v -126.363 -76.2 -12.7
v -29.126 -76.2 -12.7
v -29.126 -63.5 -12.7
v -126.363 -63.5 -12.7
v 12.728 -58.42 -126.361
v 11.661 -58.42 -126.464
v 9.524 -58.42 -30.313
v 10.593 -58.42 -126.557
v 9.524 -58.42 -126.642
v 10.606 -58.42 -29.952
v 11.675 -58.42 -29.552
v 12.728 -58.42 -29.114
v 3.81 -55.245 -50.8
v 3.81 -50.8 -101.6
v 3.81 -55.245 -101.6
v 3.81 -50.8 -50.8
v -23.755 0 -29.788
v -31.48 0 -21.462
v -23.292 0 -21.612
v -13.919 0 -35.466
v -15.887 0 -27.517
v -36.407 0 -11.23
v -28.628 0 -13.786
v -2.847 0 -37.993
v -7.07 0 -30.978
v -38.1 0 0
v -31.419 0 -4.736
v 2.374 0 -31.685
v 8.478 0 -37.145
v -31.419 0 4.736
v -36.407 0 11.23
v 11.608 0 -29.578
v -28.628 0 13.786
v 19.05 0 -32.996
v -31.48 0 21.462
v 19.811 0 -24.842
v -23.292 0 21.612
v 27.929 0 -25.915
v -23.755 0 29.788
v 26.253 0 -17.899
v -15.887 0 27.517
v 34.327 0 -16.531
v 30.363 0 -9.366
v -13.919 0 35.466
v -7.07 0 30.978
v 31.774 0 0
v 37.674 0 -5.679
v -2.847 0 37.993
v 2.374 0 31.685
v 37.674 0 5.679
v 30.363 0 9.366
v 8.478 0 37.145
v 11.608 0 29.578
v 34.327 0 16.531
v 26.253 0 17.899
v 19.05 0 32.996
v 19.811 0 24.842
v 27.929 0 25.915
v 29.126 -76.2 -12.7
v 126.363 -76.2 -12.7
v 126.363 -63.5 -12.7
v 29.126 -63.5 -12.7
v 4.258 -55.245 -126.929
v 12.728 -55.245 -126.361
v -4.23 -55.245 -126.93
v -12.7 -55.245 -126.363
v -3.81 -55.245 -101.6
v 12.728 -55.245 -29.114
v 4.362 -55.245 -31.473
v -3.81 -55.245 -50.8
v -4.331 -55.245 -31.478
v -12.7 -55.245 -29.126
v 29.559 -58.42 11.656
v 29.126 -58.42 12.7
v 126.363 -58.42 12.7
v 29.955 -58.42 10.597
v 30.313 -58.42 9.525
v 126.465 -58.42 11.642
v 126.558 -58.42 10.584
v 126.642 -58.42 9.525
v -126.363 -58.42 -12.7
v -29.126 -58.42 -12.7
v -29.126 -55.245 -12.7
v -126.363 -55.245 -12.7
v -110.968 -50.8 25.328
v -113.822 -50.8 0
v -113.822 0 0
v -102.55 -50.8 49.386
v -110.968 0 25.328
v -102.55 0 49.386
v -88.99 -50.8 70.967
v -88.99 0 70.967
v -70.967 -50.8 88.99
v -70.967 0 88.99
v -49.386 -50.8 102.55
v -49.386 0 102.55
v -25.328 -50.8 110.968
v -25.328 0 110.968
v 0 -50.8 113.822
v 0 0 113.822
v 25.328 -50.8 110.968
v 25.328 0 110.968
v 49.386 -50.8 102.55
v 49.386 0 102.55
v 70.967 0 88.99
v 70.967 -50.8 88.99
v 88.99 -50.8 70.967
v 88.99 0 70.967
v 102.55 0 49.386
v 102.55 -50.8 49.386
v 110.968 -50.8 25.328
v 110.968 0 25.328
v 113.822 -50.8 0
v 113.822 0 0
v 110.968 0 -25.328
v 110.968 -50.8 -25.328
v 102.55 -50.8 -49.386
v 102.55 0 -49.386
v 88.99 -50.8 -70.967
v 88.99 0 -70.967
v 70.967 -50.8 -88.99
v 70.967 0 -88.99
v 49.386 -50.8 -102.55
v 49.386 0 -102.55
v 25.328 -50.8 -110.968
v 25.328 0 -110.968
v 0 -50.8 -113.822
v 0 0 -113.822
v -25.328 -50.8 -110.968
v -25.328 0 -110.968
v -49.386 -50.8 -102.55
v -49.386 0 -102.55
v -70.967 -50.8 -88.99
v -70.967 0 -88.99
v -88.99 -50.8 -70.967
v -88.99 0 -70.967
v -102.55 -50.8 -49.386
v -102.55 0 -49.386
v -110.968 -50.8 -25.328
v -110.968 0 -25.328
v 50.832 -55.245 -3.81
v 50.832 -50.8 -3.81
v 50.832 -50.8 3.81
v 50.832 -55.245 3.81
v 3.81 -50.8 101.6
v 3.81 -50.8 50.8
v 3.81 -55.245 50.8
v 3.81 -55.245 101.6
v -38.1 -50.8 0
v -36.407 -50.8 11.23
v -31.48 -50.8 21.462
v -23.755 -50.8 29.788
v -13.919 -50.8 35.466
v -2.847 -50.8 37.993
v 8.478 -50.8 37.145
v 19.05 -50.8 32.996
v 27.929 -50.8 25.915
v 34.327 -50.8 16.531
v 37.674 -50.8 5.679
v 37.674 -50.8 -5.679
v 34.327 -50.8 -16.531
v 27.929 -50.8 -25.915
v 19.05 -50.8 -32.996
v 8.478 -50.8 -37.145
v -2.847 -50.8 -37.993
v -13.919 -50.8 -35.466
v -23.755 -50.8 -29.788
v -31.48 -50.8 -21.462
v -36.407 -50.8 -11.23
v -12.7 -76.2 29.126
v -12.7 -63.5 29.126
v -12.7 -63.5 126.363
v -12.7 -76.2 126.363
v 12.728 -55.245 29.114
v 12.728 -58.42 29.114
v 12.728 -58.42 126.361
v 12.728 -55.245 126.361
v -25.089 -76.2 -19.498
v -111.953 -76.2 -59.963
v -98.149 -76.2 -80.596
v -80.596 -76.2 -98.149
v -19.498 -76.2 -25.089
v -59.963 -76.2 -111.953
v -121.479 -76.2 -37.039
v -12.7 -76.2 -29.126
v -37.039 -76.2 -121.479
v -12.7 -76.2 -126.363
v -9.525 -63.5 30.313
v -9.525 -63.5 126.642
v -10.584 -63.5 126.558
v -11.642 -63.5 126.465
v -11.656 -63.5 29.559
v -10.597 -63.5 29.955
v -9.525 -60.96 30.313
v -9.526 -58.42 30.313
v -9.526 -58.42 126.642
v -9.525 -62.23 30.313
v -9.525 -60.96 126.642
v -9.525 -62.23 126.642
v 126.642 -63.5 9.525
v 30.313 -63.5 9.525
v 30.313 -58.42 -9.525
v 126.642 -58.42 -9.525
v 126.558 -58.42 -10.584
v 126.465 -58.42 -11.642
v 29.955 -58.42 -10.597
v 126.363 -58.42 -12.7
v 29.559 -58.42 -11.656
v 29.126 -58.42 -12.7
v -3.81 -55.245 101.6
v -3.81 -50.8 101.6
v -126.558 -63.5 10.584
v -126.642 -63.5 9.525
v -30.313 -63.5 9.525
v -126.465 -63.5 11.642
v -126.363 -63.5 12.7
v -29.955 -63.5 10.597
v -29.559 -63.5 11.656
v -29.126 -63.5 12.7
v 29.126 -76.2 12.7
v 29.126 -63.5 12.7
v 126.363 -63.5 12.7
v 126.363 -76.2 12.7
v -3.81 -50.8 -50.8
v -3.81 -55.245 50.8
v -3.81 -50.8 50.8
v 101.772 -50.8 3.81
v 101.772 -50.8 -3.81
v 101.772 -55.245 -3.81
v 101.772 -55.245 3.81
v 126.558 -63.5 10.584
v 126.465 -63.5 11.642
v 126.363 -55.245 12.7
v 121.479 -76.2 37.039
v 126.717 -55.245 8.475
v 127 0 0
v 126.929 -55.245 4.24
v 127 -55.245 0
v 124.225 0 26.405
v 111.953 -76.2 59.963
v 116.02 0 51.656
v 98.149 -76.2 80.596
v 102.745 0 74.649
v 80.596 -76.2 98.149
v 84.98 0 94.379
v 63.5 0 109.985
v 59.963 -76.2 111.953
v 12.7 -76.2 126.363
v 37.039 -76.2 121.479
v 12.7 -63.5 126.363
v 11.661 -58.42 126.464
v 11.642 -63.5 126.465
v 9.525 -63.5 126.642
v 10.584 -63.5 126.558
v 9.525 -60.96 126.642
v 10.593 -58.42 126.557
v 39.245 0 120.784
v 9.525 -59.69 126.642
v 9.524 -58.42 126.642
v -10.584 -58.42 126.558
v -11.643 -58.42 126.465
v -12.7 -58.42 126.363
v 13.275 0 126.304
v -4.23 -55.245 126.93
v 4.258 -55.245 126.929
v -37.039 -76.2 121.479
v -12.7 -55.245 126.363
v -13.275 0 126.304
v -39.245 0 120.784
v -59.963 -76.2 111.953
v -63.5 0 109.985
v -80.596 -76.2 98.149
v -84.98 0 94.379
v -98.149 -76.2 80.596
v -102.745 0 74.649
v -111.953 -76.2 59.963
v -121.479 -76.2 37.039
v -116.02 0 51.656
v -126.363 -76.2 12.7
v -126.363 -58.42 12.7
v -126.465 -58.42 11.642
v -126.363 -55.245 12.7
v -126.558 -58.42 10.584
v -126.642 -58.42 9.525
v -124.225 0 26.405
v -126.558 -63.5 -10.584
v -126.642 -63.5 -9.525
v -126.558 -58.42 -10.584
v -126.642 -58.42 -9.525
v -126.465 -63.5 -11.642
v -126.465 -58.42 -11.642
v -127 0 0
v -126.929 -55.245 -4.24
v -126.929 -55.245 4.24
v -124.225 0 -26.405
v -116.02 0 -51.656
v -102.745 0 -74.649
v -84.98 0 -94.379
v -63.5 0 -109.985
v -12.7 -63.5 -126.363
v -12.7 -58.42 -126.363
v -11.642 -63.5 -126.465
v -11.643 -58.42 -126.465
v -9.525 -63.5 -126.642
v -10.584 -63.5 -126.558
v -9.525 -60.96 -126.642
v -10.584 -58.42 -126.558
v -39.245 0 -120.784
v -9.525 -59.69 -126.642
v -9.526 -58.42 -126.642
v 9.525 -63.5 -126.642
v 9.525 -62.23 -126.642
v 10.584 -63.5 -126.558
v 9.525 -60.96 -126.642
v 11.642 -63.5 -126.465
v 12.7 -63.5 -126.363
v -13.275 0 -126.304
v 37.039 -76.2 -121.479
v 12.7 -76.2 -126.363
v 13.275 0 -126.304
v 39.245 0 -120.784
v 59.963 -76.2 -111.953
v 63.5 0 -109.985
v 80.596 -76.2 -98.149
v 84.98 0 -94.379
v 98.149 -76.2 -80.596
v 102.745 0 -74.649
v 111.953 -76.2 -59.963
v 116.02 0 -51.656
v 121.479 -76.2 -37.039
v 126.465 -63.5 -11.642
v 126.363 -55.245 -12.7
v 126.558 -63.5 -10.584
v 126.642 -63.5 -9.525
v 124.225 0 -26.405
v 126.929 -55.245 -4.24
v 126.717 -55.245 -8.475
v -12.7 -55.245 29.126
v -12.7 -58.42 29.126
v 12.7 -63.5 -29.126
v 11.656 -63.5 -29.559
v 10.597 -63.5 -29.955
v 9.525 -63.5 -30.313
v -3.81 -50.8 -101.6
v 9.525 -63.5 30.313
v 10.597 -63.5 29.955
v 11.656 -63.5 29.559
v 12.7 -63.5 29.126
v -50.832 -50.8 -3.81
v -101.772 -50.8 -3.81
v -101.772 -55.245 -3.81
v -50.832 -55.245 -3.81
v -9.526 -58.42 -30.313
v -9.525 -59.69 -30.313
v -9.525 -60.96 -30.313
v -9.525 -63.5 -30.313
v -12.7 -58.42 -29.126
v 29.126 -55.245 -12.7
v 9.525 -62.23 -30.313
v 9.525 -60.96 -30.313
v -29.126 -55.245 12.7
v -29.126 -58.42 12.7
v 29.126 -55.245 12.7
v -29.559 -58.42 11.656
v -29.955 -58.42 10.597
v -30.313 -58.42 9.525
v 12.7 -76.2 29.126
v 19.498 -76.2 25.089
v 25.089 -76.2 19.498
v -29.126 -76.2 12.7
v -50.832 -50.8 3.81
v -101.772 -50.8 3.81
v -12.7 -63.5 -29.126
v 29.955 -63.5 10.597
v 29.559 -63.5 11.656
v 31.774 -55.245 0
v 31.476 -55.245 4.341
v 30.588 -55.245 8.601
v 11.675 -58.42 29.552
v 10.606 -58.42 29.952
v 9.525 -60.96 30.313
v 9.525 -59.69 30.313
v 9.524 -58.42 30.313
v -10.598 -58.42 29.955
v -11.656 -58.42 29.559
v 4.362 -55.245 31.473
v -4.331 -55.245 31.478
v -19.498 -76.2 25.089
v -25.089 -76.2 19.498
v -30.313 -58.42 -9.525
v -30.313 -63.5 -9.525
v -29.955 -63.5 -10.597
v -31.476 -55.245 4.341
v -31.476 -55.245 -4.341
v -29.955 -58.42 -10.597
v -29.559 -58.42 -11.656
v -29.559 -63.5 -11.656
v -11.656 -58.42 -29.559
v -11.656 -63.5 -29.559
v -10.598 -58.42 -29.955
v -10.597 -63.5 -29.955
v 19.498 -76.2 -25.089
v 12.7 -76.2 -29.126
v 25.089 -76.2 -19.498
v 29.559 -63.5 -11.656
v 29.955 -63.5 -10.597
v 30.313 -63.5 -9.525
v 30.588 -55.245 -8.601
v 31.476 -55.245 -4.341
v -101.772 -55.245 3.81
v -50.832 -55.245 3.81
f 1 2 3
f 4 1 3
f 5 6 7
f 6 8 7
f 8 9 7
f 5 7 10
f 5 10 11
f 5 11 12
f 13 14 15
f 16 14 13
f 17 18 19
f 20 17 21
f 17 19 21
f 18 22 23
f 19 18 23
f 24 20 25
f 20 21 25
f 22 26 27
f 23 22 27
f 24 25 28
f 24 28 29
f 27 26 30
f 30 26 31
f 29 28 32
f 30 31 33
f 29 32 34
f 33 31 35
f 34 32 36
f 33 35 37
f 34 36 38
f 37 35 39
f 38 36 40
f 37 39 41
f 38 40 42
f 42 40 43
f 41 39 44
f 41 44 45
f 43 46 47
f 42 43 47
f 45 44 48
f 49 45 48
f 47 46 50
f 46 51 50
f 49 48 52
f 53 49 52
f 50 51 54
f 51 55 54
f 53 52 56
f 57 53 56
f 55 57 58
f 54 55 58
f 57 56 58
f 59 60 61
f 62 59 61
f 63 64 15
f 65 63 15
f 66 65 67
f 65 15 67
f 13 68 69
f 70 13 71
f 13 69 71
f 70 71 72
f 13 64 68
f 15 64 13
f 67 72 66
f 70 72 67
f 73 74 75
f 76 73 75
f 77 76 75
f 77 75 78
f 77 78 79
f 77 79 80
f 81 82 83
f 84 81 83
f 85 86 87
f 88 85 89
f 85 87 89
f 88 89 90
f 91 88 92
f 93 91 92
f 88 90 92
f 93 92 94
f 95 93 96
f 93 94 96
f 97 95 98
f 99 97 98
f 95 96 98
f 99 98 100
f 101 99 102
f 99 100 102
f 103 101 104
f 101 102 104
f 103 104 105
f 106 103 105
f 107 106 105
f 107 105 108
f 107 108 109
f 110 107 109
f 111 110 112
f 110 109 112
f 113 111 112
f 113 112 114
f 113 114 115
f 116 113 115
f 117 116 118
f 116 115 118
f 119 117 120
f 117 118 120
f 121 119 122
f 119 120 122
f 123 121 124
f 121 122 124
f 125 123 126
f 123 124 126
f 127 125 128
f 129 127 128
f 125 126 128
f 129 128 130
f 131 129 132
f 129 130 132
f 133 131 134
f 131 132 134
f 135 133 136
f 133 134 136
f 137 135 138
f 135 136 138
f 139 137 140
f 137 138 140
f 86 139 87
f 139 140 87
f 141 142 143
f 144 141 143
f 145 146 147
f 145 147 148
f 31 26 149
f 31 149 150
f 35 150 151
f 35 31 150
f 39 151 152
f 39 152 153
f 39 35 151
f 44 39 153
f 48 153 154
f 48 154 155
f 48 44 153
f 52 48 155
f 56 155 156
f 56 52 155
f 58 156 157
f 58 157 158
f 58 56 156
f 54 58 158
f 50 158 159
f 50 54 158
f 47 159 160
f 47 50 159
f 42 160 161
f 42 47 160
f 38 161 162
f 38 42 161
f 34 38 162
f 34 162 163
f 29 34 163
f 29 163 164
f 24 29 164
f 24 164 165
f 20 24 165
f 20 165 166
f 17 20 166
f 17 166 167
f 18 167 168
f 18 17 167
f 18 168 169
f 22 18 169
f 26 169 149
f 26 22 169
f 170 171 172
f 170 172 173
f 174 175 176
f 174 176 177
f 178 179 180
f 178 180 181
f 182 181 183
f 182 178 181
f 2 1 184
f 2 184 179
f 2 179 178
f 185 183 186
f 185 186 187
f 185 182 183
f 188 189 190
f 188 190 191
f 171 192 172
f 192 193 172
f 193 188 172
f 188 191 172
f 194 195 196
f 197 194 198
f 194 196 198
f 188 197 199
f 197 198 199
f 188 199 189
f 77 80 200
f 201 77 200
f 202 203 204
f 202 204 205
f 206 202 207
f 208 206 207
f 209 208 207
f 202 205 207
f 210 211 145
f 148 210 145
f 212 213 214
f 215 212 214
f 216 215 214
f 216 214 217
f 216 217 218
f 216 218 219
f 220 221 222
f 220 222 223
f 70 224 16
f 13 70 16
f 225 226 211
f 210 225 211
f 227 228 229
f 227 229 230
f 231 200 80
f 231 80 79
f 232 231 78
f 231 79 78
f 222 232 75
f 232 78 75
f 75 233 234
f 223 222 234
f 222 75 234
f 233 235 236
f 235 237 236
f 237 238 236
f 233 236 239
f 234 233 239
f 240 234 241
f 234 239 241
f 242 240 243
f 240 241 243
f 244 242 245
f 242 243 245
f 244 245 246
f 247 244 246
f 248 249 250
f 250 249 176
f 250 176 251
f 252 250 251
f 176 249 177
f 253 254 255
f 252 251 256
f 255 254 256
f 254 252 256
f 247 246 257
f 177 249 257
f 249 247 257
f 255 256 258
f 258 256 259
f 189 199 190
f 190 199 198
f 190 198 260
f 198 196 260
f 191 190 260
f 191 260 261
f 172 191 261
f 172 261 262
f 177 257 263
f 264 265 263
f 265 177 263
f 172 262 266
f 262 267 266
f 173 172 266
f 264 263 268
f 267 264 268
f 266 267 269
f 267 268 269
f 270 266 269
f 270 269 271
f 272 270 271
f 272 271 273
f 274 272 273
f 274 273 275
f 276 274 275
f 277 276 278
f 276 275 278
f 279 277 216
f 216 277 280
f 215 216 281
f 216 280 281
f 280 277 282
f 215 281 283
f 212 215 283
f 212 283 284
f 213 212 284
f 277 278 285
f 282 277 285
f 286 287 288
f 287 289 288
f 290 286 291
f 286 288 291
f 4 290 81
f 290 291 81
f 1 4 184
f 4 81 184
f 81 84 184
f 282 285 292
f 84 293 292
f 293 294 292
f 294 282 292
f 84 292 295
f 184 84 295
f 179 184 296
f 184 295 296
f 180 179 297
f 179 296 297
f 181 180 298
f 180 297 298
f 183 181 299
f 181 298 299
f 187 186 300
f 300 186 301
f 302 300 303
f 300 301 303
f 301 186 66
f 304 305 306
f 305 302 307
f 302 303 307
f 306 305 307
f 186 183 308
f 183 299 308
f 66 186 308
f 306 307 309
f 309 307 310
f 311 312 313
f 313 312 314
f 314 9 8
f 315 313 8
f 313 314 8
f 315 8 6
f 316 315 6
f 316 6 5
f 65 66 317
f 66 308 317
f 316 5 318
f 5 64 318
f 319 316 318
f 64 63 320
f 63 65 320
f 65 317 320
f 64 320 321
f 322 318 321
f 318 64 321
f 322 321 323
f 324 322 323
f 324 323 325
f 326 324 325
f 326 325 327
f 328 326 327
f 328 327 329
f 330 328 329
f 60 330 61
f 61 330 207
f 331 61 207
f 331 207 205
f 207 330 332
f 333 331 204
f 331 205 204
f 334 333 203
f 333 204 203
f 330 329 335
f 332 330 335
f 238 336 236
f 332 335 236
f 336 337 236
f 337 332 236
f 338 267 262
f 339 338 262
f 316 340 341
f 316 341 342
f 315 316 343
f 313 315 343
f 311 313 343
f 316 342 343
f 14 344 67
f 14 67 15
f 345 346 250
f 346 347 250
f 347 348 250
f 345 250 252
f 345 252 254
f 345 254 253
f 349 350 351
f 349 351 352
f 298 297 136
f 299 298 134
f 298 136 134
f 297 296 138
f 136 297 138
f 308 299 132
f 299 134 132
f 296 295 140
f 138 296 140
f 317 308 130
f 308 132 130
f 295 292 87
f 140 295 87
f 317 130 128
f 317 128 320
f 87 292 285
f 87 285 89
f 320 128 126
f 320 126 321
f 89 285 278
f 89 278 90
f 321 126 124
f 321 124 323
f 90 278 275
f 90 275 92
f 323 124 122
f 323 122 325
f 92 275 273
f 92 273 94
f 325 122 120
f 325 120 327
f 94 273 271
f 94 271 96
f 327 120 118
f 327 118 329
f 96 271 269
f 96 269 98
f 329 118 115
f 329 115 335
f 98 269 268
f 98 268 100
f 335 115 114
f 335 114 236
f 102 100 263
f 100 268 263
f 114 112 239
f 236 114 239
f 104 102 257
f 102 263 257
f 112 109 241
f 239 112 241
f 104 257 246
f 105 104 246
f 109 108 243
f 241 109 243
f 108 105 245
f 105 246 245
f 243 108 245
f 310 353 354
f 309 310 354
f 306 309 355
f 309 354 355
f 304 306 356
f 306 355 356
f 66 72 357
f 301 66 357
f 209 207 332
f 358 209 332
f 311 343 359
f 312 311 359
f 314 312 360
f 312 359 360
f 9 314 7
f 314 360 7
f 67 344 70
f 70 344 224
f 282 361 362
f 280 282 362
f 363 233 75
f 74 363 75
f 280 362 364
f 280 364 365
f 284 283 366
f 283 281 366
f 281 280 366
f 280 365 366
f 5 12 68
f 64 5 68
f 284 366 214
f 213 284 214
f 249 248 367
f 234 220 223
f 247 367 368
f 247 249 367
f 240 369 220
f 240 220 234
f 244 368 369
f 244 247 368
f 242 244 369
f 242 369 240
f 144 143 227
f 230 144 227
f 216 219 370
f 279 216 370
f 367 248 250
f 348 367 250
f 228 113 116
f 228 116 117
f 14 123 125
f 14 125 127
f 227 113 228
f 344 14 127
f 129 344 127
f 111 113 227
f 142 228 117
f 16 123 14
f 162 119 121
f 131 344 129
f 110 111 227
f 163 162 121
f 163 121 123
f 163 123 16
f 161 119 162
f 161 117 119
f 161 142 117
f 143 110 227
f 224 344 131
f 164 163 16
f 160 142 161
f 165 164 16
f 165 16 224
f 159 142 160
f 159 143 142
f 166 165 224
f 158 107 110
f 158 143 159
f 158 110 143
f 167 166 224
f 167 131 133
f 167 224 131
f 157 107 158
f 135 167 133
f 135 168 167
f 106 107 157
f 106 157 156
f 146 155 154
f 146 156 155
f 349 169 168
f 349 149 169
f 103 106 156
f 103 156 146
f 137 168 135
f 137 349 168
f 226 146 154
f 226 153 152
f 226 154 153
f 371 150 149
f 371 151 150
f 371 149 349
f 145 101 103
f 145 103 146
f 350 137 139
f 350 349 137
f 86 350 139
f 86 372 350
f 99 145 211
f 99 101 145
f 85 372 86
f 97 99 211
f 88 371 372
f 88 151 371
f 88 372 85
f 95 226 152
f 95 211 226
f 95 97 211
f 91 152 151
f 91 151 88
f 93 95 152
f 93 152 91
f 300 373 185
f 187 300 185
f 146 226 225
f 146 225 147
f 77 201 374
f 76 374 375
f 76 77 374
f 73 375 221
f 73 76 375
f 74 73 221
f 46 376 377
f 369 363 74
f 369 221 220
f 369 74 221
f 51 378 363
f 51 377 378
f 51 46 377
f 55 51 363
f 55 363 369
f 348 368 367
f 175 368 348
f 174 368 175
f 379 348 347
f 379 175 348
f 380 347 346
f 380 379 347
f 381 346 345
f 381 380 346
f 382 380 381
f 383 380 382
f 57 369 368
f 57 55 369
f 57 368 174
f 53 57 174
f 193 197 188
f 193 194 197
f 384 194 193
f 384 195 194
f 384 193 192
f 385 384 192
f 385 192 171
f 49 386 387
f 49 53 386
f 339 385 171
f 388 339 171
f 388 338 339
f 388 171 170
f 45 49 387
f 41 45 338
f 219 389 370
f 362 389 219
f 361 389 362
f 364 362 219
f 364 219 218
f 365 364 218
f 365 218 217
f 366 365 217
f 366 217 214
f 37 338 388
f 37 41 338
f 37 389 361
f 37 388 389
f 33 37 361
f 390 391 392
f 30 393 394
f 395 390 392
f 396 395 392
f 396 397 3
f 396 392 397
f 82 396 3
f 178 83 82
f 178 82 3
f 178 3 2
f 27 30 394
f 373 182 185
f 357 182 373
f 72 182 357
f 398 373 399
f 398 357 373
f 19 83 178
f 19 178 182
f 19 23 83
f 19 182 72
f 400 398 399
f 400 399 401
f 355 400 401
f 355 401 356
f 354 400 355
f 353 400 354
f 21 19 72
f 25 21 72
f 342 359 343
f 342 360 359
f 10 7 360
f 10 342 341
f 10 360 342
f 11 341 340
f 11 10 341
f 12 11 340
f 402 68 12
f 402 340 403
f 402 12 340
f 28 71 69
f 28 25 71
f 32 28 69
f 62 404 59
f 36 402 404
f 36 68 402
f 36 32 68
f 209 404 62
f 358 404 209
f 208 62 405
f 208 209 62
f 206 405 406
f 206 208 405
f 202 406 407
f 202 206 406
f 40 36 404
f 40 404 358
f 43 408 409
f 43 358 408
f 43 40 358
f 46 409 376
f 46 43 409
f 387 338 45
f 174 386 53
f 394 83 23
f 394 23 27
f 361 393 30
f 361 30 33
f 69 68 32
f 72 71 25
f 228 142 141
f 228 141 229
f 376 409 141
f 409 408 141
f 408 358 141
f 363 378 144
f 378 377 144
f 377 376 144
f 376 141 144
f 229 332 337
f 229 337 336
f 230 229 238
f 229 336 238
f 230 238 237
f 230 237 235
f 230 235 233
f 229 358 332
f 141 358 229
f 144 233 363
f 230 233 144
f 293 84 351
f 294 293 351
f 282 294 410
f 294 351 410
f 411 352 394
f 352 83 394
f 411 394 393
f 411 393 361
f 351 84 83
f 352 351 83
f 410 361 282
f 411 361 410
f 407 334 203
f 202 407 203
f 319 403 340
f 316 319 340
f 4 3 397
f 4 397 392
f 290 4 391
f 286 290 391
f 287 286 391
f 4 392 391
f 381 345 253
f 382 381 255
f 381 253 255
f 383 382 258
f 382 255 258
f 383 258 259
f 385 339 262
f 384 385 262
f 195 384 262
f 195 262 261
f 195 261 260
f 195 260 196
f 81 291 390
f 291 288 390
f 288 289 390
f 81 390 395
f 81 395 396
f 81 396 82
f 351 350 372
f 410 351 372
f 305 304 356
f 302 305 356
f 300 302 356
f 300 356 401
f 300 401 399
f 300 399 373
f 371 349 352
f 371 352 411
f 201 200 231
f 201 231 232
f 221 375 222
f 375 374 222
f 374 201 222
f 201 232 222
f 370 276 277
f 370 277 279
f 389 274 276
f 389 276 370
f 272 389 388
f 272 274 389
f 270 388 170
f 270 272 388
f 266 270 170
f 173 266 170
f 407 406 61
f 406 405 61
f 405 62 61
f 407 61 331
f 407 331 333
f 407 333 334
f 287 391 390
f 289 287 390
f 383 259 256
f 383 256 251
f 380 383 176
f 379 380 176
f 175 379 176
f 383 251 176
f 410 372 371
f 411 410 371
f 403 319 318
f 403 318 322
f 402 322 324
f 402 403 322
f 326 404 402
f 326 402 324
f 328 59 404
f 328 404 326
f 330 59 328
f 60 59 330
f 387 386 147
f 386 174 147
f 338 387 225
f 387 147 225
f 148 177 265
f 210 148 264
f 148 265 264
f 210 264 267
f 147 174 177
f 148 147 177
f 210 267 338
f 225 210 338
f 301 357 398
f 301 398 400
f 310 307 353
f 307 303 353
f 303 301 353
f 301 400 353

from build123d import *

# Parameters (mm, degrees)
F0_R     = 127
F0_R_2   = 31.774252
F1_DEPTH = 76.2
F3_DEPTH = 127
F5_DEPTH = 127
F6_R     = 113.822054
F6_R_2   = 38.1
F7_DEPTH = 50.8
F8_W     = 50.940839
F8_H     = 7.62
F8_W_2   = 7.62
F8_H_2   = 50.8
F9_DEPTH = 76.2


with BuildPart() as f1:
    # F0 (on Front) → F1 (new body)
    with BuildSketch(Plane.XZ):
        Circle(F0_R)
        Circle(F0_R_2, mode=Mode.SUBTRACT)
    extrude(amount=F1_DEPTH)

    # F2 (on Right) → F3 (cut, symmetric)
    with BuildSketch(Plane.YZ):
        Polygon((-63.5, 12.7), (-76.2, 12.7), (-76.2, -12.7), (-63.5, -12.7), (-63.5, -9.525), (-58.42, -9.525), (-58.42, -12.7), (-55.245, -12.7), (-55.245, 12.7), (-58.42, 12.7), (-58.42, 9.525), (-63.5, 9.525), align=None)
    extrude(amount=F3_DEPTH, both=True, mode=Mode.SUBTRACT)

    # F4 (on Top) → F5 (cut, symmetric)
    with BuildSketch(Plane.XY):
        Polygon((12.7, -76.2), (12.7, -63.5), (9.525, -63.5), (9.524411, -58.42), (12.728042, -58.42), (12.728042, -55.245), (-12.7, -55.245), (-12.7, -58.42), (-9.52559, -58.42), (-9.525, -63.5), (-12.7, -63.5), (-12.7, -76.2), align=None)
    extrude(amount=F5_DEPTH, both=True, mode=Mode.SUBTRACT)

    # F6 (on face) → F7 (cut)
    with BuildSketch(Plane(origin=(0, 0, 0), x_dir=(-1, 0, 0), z_dir=(0, 1, 0))):
        Circle(F6_R)
        Circle(F6_R_2, mode=Mode.SUBTRACT)
    extrude(amount=-F7_DEPTH, mode=Mode.SUBTRACT)

    # F8 (on Front) → F9 (cut)
    with BuildSketch(Plane.XZ):
        with Locations((76.30205, 0)):
            Rectangle(F8_W, F8_H)
        with Locations((-76.30205, 0)):
            Rectangle(F8_W, F8_H)
        with Locations((0, -76.2)):
            Rectangle(F8_W_2, F8_H_2)
        with Locations((0, 76.2)):
            Rectangle(F8_W_2, F8_H_2)
    extrude(amount=F9_DEPTH, mode=Mode.SUBTRACT)


solid = f1.part
